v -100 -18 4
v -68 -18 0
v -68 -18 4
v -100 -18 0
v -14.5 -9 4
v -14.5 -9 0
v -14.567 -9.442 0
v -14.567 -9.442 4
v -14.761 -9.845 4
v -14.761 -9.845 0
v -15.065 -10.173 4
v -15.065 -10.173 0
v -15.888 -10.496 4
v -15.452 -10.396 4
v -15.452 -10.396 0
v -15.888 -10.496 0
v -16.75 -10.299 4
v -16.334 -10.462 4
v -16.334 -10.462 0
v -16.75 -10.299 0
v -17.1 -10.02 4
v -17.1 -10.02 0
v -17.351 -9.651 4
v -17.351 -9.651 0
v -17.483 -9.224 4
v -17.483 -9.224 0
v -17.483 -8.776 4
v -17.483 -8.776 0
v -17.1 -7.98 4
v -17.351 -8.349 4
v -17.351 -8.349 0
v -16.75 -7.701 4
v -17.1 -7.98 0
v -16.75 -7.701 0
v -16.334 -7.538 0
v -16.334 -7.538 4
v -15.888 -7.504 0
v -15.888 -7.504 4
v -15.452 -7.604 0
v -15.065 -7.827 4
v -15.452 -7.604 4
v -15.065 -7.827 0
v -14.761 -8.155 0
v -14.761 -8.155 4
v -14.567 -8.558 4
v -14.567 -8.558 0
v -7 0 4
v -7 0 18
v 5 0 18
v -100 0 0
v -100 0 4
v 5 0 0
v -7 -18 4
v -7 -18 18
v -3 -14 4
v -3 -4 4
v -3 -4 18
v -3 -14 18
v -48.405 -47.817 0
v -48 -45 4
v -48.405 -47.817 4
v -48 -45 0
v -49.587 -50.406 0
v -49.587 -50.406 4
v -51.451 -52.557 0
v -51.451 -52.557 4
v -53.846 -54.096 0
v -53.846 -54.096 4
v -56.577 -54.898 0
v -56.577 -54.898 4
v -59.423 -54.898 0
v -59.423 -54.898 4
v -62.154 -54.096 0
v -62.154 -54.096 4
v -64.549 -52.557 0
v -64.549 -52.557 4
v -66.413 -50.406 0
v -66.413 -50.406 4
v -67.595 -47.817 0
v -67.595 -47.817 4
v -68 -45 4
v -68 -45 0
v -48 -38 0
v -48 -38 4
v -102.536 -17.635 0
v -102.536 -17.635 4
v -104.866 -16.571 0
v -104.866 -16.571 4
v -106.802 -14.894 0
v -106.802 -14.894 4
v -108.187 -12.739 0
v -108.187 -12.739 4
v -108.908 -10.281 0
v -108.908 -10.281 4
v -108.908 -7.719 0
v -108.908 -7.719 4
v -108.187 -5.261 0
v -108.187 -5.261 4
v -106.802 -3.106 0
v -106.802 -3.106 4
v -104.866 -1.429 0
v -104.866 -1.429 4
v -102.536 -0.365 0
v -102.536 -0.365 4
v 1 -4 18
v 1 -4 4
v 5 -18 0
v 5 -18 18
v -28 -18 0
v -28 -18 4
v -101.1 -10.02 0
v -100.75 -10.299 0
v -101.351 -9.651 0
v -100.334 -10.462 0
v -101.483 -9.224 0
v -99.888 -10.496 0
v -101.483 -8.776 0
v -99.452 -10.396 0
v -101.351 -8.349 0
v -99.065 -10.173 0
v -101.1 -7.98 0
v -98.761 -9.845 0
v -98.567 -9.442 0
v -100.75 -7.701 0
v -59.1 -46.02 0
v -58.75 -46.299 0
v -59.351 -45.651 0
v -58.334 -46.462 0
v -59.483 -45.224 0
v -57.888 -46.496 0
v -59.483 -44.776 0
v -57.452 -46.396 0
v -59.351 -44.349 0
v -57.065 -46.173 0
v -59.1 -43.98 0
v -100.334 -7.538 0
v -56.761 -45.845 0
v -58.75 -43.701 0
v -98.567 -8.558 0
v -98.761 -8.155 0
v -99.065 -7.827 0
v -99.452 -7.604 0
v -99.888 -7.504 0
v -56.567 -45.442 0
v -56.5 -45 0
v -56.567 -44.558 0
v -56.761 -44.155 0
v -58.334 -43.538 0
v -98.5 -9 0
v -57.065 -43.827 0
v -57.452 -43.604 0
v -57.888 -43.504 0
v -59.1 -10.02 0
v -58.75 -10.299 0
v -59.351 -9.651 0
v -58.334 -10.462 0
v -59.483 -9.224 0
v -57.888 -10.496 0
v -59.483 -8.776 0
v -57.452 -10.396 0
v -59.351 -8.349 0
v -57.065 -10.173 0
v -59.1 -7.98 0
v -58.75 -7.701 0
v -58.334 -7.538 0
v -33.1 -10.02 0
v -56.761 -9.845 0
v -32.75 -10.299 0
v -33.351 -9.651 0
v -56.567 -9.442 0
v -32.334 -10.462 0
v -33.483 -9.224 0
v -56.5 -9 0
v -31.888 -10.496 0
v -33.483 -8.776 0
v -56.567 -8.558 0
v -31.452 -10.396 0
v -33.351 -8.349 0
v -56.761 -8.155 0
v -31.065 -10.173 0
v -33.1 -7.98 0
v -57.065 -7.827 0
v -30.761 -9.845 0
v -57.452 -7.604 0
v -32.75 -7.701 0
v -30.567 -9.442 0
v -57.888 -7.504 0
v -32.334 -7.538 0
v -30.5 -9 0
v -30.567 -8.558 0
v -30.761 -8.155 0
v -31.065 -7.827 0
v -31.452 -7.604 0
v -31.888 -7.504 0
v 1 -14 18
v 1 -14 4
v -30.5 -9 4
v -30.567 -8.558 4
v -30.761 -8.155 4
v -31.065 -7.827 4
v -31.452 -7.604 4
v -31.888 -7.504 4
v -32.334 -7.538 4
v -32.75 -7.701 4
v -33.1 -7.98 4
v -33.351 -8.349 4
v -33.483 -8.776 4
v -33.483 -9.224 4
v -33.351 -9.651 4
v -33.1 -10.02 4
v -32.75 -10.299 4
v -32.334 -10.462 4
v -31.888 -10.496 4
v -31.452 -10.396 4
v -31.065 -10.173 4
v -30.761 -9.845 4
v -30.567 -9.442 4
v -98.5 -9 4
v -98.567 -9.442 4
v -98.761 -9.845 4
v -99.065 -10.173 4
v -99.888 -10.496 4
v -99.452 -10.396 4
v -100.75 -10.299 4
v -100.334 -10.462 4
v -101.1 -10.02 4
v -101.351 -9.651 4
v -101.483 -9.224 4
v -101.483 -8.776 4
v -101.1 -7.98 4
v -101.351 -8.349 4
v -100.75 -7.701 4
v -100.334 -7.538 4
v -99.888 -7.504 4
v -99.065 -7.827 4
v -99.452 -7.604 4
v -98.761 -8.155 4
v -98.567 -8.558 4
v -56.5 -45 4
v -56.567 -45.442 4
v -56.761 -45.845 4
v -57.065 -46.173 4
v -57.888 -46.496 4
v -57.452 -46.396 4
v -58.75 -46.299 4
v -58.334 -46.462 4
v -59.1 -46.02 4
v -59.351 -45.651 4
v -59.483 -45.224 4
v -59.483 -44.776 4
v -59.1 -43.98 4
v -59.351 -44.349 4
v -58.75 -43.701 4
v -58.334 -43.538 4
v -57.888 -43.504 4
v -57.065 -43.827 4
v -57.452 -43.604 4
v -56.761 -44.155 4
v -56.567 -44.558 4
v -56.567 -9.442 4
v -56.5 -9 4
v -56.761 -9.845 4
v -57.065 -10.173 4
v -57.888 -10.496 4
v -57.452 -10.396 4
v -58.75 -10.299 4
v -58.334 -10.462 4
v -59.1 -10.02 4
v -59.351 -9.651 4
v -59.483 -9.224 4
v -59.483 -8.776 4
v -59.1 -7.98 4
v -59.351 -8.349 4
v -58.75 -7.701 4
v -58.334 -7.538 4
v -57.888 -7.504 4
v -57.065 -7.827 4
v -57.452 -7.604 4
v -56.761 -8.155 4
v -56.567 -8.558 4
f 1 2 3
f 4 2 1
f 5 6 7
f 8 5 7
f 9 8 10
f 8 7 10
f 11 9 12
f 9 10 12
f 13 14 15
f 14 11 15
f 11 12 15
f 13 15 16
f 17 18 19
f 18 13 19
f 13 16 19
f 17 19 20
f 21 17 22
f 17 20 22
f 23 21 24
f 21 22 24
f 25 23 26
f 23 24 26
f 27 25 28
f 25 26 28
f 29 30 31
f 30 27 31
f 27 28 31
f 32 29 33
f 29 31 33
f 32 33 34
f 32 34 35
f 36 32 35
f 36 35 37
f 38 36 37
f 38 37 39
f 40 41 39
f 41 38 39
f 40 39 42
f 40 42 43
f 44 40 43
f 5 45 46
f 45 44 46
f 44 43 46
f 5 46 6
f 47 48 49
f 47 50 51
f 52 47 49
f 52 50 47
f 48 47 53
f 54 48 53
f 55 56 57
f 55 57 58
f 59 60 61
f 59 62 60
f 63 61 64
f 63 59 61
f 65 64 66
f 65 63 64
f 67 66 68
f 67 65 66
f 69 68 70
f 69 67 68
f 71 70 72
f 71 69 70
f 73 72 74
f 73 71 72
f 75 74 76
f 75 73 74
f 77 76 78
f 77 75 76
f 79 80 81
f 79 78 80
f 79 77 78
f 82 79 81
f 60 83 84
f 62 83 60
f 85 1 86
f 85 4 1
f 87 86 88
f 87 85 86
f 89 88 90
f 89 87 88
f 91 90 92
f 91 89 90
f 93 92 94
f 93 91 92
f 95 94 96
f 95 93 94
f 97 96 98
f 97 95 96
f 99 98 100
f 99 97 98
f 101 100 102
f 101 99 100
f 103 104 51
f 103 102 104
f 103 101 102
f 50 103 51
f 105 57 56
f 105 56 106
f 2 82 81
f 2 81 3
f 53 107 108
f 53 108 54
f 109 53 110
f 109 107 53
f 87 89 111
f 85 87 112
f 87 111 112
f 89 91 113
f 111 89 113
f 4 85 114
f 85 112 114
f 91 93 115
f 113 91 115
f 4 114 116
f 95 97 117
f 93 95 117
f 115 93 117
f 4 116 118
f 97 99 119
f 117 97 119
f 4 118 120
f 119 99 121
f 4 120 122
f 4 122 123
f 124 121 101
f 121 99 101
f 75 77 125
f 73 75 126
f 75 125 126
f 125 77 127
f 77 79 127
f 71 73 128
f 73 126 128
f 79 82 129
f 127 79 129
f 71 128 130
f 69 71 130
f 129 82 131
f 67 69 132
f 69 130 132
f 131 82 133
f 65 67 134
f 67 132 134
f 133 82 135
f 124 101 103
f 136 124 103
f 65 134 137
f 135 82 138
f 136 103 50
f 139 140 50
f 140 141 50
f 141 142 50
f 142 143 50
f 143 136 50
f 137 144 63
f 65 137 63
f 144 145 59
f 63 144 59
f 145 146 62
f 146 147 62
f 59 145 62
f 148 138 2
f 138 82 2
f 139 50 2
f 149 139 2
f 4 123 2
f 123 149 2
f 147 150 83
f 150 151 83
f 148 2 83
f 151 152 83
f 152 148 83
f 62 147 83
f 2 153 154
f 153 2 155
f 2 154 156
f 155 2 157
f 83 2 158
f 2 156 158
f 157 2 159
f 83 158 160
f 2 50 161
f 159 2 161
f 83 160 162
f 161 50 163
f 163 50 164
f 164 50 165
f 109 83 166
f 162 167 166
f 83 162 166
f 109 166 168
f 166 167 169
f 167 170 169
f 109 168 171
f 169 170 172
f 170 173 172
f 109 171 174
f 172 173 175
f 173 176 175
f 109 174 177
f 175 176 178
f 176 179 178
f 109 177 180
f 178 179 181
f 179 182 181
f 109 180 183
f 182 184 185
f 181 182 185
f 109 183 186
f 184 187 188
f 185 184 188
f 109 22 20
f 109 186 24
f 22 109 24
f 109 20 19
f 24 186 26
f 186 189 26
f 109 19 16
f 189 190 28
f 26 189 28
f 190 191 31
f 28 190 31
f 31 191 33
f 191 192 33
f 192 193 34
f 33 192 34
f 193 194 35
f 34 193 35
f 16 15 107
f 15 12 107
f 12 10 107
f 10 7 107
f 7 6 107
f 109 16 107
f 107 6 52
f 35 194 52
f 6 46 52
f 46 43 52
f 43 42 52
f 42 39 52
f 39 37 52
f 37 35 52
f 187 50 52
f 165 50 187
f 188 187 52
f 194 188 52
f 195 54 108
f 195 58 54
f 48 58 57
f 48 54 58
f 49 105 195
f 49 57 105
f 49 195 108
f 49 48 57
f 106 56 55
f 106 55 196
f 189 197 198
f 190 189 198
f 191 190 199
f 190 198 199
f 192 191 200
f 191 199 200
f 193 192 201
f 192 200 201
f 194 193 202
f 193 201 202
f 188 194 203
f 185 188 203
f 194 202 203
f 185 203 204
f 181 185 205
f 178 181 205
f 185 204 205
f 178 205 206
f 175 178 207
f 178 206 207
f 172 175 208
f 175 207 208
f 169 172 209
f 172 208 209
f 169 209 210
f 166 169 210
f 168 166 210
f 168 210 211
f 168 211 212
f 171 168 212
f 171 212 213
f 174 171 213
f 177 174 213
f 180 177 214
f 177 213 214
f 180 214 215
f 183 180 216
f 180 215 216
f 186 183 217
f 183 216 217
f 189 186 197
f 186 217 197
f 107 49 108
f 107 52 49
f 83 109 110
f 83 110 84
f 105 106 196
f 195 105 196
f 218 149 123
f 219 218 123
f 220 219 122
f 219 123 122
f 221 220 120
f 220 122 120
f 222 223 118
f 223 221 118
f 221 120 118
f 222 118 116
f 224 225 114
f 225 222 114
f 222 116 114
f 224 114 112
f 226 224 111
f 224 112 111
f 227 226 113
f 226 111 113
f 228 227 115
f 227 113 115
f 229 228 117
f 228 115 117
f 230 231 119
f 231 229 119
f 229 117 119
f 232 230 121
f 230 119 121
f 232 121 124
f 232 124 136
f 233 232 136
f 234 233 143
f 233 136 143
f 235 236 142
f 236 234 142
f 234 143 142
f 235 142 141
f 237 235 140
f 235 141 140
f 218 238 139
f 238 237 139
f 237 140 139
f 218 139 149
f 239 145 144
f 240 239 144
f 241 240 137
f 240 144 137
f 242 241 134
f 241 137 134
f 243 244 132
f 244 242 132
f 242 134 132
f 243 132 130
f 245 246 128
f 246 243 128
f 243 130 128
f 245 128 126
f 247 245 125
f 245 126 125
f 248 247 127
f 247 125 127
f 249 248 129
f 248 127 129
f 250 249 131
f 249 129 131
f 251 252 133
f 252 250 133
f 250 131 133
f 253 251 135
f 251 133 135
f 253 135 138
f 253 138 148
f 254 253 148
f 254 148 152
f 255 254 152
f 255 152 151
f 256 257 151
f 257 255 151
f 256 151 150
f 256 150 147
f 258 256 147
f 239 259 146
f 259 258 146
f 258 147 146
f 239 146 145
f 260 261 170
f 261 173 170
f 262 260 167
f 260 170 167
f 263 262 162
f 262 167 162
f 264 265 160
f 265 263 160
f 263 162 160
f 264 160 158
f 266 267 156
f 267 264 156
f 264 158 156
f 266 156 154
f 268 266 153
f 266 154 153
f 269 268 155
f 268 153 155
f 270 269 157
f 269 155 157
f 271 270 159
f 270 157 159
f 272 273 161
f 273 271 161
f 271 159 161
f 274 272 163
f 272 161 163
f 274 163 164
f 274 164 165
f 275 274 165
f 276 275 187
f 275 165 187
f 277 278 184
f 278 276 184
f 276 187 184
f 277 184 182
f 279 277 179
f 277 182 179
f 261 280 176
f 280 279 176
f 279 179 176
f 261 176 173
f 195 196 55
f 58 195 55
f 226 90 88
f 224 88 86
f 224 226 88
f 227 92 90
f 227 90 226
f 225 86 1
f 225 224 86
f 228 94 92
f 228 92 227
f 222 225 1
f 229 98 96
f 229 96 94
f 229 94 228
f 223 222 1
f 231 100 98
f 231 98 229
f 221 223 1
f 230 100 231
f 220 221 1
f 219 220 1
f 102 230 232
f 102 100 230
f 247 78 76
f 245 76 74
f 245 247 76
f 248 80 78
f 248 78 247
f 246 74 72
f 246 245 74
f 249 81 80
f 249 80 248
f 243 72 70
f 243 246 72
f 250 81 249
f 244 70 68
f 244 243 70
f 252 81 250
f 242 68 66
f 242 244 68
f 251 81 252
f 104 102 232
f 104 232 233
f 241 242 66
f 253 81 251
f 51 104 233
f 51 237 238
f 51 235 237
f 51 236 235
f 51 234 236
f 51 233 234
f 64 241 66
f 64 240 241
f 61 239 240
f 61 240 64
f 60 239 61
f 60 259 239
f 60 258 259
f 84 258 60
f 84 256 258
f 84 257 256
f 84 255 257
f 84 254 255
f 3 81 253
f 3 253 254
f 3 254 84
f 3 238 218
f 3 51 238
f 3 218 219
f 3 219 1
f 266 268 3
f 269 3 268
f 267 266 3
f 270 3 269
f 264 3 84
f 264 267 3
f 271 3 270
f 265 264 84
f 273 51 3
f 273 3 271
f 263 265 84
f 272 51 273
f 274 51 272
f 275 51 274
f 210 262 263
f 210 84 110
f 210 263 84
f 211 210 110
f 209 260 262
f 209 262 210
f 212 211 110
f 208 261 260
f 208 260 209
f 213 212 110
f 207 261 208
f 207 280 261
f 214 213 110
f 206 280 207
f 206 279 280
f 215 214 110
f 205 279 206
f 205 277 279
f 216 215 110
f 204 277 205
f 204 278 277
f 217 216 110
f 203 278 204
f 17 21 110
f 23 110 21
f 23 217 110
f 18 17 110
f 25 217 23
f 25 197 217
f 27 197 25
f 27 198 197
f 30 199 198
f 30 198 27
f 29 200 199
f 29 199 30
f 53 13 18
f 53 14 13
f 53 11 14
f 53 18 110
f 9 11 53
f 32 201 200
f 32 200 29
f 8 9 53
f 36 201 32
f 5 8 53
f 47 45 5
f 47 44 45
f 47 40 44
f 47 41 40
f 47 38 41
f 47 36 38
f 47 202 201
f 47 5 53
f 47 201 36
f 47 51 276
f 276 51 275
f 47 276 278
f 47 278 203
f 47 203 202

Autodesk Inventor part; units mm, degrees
ref_plane "YZ Plane" through (0, 0, 0) normal (1, 0, 0) x (0, 1, 0)
ref_plane "XZ Plane" through (0, 0, 0) normal (0, 1, 0) x (-1, 0, 0)
ref_plane "XY Plane" through (0, 0, 0) normal (0, 0, 1) x (1, 0, 0)
sketch "Sketch1" plane through (0, 0, 0) normal (0, 0, 1) x (1, 0, 0)
  line L0 (0, 0) -> (-100, 0)
  circle A0 centre (-100, -9) radius 1.5
  circle A1 centre (-16, -9) radius 1.5
  circle A2 centre (-58, -9) radius 1.5
  circle A3 centre (-58, -45) radius 1.5
  arc A4 (-100, 0) -> (-100, -18) centre (-100, -9) ccw
  arc A5 (-68, -45) -> (-48, -45) centre (-58, -45) ccw
  line L1 (0, -18) -> (-28, -18)
  line L2 (-28, -18) -> (-48, -38)
  line L3 (-48, -38) -> (-48, -45)
  line L4 (-68, -45) -> (-68, -18)
  line L5 (-68, -18) -> (-100, -18)
  line L6 (0, 0) -> (5, 0)
  line L7 (5, 0) -> (5, -18)
  line L8 (5, -18) -> (0, -18)
  dimension "d0" = 100
  dimension "d1" = 3
  dimension "d2" = 3
  dimension "d3" = 3
  dimension "d4" = 3
  dimension "d5" = 18
  dimension "d6" = 20
  dimension "d7" = 18
  dimension "d8" = 28
  dimension "d9" = 32
  dimension "d10" = 27
  dimension "d11" = 20
  dimension "d12" = 20
  dimension "d13" = 16
  dimension "d14" = 42
  dimension "d15" = 42
  dimension "d16" = 9
  dimension "d17" = 9
  dimension "d69" = 5
  dimension "d70" = 18
  dimension "d71" = 90
extrude "Extrusion7" add sketch "Sketch1" along normal blind 4
sketch "Sketch6" plane through (0, 0, 4) normal (0, 0, 1) x (1, 0, 0)
  line L0 (5, 0) -> (-100, 0) projected
  line L1 (5, 0) -> (-7, 0)
  line L2 (-7, 0) -> (-7, -18)
  line L3 (-7, -18) -> (5, -18)
  line L4 (5, -18) -> (5, 0)
  point P0 (0, 0)
  dimension "d74" = 12
  dimension "d75" = 18
extrude "Extrusion8" add sketch "Sketch6" along normal blind 14
shell "Shell6" thickness 4 removed faces 1 at (-3, -12, 18)
sketch "Sketch7" plane through (0, 0, 4) normal (0, 0, 1) x (1, 0, 0)
  point P0 (0, 0)
sketch "Sketch8" plane through (0, 0, 4) normal (0, 0, 1) x (1, 0, 0)
  point P0 (0, 0)
sketch "Sketch9" plane through (0, 0, 4) normal (0, 0, 1) x (1, 0, 0)
  circle A0 centre (-32, -9) radius 1.5
  circle A1 centre (-16, -9) radius 1.5 projected
  line L0 (5, 0) -> (-7, 0) projected
  point P0 (0, 0)
  dimension "d79" = 3
  dimension "d80" = 16
  dimension "d81" = 9
extrude "Extrusion9" cut sketch "Sketch9" against normal through all contours A0
properties part number "Fall-Wk-3 - Mounting Bracket 1of3"
